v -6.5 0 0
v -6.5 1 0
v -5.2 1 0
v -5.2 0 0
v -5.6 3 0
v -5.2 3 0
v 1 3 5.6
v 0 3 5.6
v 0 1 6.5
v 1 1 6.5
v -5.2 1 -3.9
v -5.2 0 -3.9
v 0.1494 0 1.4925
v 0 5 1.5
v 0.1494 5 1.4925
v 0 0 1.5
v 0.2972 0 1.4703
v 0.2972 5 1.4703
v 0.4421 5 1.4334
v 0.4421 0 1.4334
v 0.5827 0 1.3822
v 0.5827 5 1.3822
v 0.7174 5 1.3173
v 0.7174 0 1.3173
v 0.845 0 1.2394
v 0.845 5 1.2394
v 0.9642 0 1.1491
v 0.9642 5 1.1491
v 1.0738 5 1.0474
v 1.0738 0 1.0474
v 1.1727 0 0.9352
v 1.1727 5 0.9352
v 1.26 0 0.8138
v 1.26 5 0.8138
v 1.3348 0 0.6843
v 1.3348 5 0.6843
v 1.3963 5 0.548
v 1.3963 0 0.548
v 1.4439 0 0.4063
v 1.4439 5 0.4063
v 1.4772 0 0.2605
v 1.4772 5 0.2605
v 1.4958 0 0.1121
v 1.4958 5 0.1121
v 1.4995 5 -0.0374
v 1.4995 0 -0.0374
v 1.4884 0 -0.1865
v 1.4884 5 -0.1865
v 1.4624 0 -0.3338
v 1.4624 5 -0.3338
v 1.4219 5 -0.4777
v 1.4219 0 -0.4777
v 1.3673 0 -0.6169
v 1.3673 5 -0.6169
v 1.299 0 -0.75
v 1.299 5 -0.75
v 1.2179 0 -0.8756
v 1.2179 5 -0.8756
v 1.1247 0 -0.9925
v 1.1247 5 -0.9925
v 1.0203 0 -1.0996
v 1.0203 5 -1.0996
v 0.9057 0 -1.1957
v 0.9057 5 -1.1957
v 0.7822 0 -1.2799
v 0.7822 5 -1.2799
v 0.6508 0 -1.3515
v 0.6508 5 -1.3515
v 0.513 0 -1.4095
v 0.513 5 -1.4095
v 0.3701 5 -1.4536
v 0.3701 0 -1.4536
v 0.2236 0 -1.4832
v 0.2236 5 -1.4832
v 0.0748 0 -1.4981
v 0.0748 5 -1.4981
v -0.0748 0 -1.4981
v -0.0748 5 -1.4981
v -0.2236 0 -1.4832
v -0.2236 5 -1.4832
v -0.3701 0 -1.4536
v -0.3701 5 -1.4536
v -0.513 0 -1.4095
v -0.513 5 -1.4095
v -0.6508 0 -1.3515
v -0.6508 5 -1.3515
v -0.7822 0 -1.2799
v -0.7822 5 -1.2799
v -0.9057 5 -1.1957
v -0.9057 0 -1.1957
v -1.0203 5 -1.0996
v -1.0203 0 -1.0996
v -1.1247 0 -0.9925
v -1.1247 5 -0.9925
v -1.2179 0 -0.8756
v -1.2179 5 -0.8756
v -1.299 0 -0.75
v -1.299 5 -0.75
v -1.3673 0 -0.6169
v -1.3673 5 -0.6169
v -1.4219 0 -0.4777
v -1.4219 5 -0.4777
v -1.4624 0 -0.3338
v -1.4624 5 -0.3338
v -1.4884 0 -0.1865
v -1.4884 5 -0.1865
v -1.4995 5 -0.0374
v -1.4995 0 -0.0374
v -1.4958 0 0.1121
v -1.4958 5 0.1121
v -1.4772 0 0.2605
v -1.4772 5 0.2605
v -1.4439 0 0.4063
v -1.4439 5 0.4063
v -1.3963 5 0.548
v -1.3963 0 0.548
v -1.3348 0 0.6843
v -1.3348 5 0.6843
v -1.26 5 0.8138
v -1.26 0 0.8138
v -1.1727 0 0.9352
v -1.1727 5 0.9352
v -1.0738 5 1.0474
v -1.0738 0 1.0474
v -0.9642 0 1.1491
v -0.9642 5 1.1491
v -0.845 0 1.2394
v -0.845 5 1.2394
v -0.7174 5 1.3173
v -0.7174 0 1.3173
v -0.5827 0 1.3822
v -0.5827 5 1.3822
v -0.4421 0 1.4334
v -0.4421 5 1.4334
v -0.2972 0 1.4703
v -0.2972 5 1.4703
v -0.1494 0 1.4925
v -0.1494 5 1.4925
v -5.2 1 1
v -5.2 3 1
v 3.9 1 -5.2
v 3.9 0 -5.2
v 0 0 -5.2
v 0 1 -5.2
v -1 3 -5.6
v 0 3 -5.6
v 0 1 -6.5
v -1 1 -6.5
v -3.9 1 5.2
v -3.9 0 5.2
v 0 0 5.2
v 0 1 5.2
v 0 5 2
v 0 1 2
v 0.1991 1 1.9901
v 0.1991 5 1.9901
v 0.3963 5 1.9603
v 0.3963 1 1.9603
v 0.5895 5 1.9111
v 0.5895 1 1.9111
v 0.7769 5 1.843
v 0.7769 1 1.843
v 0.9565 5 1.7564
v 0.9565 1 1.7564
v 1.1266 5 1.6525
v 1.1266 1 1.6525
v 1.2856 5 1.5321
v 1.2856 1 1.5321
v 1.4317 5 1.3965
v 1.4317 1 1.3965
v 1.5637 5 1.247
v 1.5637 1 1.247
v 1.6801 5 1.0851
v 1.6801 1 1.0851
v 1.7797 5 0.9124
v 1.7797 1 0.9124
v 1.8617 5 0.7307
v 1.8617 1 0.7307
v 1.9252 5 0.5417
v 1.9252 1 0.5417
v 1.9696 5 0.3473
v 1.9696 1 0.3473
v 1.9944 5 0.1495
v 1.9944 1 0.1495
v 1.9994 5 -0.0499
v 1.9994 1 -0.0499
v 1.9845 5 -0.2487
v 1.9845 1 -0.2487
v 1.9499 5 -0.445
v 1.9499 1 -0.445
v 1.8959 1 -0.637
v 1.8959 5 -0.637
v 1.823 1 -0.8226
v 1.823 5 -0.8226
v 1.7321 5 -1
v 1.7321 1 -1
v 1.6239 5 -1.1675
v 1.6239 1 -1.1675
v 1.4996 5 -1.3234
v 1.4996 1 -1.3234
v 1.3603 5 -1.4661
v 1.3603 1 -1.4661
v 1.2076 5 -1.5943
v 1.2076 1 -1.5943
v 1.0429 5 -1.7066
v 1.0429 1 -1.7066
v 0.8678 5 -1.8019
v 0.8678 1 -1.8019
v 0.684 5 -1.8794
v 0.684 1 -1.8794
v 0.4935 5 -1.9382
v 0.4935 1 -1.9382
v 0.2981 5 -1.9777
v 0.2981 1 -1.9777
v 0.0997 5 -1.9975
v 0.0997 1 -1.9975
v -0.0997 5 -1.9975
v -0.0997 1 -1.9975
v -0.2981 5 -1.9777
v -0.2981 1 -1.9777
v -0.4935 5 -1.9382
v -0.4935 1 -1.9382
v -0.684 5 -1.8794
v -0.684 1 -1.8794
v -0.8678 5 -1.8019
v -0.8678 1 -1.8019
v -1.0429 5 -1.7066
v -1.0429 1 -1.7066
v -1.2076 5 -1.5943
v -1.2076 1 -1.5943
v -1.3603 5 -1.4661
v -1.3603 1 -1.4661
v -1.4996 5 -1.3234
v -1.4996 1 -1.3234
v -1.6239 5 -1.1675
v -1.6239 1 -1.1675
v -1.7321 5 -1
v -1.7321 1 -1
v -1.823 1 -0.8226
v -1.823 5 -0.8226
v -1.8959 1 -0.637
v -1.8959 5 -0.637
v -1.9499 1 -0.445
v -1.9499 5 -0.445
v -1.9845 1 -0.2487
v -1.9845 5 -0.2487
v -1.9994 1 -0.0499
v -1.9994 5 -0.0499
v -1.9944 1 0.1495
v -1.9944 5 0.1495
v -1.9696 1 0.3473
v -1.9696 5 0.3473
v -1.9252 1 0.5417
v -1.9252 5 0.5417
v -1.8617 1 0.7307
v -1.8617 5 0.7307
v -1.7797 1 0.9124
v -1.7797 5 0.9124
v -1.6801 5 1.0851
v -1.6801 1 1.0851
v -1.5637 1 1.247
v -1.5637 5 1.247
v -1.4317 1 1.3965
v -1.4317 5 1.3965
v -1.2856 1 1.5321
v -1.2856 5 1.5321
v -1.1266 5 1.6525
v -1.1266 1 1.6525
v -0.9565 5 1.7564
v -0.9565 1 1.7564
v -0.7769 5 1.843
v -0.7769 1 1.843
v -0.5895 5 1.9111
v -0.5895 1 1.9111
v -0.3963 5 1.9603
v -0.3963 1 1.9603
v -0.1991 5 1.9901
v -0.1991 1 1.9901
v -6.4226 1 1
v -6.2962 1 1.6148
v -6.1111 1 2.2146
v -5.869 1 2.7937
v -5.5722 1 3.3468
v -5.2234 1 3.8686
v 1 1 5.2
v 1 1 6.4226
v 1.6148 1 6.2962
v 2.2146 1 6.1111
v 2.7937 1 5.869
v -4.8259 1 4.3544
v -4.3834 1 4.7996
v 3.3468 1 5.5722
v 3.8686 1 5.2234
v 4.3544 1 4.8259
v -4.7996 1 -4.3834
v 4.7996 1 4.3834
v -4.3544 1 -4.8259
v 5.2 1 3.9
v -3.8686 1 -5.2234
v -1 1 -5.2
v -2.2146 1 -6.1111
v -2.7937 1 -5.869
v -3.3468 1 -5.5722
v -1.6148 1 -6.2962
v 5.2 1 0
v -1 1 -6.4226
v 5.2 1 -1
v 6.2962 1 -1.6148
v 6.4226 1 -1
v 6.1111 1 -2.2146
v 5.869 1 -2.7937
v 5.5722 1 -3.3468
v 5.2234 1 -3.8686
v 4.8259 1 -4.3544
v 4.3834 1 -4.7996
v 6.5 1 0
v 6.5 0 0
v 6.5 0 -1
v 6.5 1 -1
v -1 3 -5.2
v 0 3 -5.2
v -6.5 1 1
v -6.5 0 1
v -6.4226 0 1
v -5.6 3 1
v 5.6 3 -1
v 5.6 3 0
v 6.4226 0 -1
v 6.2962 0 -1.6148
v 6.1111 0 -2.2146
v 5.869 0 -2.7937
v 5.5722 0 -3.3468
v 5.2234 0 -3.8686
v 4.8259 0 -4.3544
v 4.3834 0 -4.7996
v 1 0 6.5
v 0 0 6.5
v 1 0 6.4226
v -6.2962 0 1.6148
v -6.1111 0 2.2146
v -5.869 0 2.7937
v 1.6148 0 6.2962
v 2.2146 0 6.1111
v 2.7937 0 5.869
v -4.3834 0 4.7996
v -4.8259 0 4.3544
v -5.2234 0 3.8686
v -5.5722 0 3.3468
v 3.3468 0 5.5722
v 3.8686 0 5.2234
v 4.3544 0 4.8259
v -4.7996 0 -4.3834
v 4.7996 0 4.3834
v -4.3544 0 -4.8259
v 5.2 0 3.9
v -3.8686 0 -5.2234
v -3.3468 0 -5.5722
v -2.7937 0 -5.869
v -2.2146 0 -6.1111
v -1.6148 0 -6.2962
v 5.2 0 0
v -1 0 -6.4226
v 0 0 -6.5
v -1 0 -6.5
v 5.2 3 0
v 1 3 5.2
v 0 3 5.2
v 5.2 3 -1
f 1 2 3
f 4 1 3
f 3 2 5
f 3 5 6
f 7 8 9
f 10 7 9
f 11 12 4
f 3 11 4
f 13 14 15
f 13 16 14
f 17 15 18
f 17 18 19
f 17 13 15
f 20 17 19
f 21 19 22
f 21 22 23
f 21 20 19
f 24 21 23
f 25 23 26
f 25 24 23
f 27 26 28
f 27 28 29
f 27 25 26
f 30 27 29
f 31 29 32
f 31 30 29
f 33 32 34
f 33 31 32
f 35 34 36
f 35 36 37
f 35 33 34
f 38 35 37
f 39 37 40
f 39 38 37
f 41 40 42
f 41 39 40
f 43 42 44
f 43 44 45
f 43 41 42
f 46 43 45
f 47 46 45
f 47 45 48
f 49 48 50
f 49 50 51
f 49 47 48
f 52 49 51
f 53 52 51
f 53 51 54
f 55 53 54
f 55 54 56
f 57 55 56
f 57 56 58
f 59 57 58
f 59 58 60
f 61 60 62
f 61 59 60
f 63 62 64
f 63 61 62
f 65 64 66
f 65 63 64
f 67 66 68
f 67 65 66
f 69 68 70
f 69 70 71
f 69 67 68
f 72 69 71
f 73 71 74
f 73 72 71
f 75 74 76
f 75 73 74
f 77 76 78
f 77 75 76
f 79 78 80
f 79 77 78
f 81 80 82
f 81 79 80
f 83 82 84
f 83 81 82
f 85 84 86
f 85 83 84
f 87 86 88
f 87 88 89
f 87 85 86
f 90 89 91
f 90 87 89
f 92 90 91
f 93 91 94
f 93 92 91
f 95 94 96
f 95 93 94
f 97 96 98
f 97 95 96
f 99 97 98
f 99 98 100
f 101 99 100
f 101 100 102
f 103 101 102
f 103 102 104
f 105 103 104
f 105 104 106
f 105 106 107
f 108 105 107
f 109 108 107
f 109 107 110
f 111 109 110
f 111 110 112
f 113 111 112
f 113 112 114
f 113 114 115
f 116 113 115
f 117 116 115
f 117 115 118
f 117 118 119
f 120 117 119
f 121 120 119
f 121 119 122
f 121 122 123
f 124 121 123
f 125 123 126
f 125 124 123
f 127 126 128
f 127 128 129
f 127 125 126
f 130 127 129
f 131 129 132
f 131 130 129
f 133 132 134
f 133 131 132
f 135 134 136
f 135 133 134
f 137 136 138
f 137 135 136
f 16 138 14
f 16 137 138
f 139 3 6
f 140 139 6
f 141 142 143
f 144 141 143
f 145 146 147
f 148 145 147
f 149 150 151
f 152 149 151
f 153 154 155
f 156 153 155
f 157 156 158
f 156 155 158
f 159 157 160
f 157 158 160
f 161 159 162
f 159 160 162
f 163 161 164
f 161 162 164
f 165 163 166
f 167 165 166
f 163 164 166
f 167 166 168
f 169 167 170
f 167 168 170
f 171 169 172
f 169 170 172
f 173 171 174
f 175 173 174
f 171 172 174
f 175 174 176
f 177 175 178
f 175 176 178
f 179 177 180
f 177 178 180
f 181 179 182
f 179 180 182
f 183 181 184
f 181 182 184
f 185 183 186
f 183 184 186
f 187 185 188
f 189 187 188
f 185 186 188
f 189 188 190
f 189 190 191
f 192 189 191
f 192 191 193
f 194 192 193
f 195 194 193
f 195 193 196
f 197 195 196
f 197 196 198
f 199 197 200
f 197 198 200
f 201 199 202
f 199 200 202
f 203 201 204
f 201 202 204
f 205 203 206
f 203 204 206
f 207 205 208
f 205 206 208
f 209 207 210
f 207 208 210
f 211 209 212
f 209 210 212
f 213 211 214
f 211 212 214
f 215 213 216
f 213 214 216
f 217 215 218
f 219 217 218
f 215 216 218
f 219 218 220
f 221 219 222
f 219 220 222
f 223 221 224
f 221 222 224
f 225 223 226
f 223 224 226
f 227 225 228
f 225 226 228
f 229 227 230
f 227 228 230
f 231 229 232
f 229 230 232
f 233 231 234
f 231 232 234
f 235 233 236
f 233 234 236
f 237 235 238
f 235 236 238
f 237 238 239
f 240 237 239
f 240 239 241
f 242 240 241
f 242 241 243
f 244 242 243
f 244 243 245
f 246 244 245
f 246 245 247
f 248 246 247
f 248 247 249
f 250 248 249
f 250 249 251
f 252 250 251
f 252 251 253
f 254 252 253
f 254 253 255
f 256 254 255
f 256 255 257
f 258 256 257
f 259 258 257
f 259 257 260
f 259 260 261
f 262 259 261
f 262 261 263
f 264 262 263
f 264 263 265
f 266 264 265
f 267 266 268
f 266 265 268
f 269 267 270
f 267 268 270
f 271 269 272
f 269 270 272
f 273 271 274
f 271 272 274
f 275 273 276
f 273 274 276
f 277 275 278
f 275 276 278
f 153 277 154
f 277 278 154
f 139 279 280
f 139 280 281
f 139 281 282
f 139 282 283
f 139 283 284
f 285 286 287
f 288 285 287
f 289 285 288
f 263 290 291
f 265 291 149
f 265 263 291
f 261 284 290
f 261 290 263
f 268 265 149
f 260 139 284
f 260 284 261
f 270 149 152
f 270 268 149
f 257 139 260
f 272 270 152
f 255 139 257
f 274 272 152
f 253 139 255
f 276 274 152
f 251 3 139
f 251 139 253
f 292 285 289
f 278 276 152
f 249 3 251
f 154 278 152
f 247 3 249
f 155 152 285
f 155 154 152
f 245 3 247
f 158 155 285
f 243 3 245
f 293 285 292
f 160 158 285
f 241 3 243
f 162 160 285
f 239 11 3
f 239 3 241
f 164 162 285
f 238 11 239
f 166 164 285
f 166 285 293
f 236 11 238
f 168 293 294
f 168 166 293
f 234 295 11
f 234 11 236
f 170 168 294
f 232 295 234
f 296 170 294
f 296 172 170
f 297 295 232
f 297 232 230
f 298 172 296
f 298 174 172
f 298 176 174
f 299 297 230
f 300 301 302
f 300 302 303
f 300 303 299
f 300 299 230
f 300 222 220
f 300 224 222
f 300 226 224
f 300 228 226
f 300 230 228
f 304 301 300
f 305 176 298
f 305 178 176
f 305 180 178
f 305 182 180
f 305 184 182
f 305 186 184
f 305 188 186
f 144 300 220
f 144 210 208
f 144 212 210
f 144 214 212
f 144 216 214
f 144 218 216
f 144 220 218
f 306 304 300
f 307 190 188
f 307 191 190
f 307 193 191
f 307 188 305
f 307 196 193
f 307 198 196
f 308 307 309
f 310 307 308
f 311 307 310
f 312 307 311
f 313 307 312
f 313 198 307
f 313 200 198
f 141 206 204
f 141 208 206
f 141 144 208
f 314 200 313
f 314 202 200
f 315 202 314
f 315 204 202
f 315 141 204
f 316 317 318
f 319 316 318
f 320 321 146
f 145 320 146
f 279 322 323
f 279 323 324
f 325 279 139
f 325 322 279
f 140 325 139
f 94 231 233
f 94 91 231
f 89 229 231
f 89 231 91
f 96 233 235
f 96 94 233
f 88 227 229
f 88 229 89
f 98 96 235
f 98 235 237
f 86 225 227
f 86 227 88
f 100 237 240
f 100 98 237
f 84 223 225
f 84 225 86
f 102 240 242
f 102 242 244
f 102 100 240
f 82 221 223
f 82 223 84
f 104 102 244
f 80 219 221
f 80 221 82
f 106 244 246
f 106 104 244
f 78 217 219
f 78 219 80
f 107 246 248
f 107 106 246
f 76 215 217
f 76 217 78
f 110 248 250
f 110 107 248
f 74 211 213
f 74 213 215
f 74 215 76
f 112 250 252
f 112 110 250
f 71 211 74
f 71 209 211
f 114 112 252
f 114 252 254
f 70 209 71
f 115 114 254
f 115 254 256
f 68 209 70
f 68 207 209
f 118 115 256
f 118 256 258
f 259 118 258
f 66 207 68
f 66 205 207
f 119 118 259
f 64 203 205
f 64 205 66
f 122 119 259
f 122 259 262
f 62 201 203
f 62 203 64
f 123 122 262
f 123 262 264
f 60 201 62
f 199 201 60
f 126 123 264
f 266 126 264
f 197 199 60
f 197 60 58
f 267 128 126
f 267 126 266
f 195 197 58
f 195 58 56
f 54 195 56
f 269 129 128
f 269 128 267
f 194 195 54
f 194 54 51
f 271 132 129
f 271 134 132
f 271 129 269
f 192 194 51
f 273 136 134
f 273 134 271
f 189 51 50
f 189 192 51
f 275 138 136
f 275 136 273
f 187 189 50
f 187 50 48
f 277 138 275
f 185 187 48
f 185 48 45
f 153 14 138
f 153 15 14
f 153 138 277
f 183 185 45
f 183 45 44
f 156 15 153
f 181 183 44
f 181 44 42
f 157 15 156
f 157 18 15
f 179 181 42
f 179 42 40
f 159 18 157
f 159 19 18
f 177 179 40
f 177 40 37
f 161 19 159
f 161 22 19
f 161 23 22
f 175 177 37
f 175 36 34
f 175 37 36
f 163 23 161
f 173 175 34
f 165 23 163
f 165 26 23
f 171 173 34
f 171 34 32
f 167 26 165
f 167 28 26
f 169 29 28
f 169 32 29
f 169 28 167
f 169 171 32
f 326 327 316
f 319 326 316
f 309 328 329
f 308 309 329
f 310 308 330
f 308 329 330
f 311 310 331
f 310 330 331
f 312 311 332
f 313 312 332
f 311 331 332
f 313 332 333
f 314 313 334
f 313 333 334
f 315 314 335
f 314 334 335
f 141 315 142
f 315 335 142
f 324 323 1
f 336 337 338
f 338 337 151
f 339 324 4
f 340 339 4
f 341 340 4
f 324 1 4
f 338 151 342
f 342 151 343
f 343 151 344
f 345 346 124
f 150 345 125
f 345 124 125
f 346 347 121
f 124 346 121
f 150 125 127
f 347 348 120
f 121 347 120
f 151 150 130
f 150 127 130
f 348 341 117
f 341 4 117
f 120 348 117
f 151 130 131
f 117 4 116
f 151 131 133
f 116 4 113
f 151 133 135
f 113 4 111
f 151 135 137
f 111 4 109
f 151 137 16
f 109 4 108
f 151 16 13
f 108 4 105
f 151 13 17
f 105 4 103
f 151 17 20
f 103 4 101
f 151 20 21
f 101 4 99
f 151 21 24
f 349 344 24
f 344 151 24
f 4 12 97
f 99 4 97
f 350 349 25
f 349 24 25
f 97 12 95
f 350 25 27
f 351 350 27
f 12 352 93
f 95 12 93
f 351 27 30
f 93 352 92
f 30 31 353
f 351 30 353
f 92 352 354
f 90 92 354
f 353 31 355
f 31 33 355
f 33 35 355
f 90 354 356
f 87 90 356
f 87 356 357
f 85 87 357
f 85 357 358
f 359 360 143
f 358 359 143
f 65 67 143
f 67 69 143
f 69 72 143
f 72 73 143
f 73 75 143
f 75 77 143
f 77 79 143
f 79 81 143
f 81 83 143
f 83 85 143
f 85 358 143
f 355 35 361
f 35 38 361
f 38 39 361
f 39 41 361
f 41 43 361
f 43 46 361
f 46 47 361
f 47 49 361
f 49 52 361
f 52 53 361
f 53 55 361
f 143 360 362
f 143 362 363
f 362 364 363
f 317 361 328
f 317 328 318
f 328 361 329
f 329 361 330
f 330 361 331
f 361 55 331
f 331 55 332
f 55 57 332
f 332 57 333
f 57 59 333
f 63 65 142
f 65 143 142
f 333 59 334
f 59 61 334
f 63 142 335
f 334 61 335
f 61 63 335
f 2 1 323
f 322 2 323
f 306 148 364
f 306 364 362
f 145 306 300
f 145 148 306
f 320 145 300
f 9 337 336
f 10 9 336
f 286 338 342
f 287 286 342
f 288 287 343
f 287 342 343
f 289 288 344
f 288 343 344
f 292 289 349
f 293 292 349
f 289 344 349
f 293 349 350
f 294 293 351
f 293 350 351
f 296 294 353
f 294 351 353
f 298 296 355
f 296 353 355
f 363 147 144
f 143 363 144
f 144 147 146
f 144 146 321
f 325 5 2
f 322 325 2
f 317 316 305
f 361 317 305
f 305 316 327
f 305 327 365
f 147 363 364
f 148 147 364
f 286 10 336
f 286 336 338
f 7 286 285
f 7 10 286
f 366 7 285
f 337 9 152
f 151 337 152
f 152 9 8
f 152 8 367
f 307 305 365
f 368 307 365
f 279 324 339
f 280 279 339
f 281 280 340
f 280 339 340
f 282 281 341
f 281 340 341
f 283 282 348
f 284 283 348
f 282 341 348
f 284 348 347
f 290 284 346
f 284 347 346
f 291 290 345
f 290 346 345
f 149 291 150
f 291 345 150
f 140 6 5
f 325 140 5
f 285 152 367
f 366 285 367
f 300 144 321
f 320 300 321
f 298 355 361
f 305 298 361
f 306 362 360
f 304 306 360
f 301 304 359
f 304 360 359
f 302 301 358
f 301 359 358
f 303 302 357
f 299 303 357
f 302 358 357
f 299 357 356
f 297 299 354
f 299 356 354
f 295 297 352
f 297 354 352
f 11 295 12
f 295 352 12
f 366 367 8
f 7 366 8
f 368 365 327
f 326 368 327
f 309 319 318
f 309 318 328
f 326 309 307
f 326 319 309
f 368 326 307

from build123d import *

# Parameters (mm, degrees)
SKETCH1_R           = 1.5
BOSS_EXTRUDE1_DEPTH = 1
BOSS_EXTRUDE2_DEPTH = 1
CIRPATTERN1_COUNT   = 4
SKETCH4_R           = 2
SKETCH4_R_2         = 1.5
BOSS_EXTRUDE3_DEPTH = 4


with BuildPart() as part:
    # Sketch1 → Boss-Extrude1 (new body)
    with BuildSketch(Plane(origin=(0, 0, 0), x_dir=(1, 0, 0), z_dir=(0, 1, 0))):
        with BuildLine():
            Line((-5.2, 3.9), (-5.2, 0))
            Line((-5.2, 0), (-6.5, 0))
            Line((-6.5, 0), (-6.5, -1))
            Line((-6.5, -1), (-6.422616289, -1))
            ThreePointArc((-6.422616289, -1), (-5.572172087, -3.346774303), (-3.9, -5.2))
            Line((-3.9, -5.2), (0, -5.2))
            Line((0, -5.2), (0, -6.5))
            Line((0, -6.5), (1, -6.5))
            Line((1, -6.5), (1, -6.422616289))
            ThreePointArc((1, -6.422616289), (3.346774303, -5.572172087), (5.2, -3.9))
            Line((5.2, -3.9), (5.2, 0))
            Line((5.2, 0), (6.5, 0))
            Line((6.5, 0), (6.5, 1))
            Line((6.5, 1), (6.422616289, 1))
            ThreePointArc((6.422616289, 1), (5.572172087, 3.346774303), (3.9, 5.2))
            Line((3.9, 5.2), (0, 5.2))
            Line((0, 5.2), (0, 6.5))
            Line((0, 6.5), (-1, 6.5))
            Line((-1, 6.5), (-1, 6.422616289))
            ThreePointArc((-1, 6.422616289), (-3.346774303, 5.572172087), (-5.2, 3.9))
        make_face()
        with Locations(Location((0, 0, 0), (0, 0, 270))):
            Circle(SKETCH1_R, mode=Mode.SUBTRACT)
    extrude(amount=BOSS_EXTRUDE1_DEPTH)

    # Sketch3 → Boss-Extrude2 (add)
    with BuildSketch(Plane.ZY):
        Polygon((5.2, 1), (5.2, 3), (5.6, 3), (6.5, 1), align=None)
    boss_extrude2 = extrude(amount=-BOSS_EXTRUDE2_DEPTH)

    # CirPattern1: Boss-Extrude2 ×4 about axis
    cirpattern1_axis = Axis((0, 0, 0), (0, 1, 0))
    for i in range(1, CIRPATTERN1_COUNT):
        add(boss_extrude2.rotate(cirpattern1_axis, i * 360 / CIRPATTERN1_COUNT))

    # Sketch4 → Boss-Extrude3 (add)
    with BuildSketch(Plane(origin=(0, 1, 0), x_dir=(1, 0, 0), z_dir=(0, 1, 0))):
        with Locations(Location((0, 0, 0), (0, 0, 270))):
            Circle(SKETCH4_R)
        with Locations(Location((0, 0, 0), (0, 0, 270))):
            Circle(SKETCH4_R_2, mode=Mode.SUBTRACT)
    extrude(amount=BOSS_EXTRUDE3_DEPTH)


solid = part.part
